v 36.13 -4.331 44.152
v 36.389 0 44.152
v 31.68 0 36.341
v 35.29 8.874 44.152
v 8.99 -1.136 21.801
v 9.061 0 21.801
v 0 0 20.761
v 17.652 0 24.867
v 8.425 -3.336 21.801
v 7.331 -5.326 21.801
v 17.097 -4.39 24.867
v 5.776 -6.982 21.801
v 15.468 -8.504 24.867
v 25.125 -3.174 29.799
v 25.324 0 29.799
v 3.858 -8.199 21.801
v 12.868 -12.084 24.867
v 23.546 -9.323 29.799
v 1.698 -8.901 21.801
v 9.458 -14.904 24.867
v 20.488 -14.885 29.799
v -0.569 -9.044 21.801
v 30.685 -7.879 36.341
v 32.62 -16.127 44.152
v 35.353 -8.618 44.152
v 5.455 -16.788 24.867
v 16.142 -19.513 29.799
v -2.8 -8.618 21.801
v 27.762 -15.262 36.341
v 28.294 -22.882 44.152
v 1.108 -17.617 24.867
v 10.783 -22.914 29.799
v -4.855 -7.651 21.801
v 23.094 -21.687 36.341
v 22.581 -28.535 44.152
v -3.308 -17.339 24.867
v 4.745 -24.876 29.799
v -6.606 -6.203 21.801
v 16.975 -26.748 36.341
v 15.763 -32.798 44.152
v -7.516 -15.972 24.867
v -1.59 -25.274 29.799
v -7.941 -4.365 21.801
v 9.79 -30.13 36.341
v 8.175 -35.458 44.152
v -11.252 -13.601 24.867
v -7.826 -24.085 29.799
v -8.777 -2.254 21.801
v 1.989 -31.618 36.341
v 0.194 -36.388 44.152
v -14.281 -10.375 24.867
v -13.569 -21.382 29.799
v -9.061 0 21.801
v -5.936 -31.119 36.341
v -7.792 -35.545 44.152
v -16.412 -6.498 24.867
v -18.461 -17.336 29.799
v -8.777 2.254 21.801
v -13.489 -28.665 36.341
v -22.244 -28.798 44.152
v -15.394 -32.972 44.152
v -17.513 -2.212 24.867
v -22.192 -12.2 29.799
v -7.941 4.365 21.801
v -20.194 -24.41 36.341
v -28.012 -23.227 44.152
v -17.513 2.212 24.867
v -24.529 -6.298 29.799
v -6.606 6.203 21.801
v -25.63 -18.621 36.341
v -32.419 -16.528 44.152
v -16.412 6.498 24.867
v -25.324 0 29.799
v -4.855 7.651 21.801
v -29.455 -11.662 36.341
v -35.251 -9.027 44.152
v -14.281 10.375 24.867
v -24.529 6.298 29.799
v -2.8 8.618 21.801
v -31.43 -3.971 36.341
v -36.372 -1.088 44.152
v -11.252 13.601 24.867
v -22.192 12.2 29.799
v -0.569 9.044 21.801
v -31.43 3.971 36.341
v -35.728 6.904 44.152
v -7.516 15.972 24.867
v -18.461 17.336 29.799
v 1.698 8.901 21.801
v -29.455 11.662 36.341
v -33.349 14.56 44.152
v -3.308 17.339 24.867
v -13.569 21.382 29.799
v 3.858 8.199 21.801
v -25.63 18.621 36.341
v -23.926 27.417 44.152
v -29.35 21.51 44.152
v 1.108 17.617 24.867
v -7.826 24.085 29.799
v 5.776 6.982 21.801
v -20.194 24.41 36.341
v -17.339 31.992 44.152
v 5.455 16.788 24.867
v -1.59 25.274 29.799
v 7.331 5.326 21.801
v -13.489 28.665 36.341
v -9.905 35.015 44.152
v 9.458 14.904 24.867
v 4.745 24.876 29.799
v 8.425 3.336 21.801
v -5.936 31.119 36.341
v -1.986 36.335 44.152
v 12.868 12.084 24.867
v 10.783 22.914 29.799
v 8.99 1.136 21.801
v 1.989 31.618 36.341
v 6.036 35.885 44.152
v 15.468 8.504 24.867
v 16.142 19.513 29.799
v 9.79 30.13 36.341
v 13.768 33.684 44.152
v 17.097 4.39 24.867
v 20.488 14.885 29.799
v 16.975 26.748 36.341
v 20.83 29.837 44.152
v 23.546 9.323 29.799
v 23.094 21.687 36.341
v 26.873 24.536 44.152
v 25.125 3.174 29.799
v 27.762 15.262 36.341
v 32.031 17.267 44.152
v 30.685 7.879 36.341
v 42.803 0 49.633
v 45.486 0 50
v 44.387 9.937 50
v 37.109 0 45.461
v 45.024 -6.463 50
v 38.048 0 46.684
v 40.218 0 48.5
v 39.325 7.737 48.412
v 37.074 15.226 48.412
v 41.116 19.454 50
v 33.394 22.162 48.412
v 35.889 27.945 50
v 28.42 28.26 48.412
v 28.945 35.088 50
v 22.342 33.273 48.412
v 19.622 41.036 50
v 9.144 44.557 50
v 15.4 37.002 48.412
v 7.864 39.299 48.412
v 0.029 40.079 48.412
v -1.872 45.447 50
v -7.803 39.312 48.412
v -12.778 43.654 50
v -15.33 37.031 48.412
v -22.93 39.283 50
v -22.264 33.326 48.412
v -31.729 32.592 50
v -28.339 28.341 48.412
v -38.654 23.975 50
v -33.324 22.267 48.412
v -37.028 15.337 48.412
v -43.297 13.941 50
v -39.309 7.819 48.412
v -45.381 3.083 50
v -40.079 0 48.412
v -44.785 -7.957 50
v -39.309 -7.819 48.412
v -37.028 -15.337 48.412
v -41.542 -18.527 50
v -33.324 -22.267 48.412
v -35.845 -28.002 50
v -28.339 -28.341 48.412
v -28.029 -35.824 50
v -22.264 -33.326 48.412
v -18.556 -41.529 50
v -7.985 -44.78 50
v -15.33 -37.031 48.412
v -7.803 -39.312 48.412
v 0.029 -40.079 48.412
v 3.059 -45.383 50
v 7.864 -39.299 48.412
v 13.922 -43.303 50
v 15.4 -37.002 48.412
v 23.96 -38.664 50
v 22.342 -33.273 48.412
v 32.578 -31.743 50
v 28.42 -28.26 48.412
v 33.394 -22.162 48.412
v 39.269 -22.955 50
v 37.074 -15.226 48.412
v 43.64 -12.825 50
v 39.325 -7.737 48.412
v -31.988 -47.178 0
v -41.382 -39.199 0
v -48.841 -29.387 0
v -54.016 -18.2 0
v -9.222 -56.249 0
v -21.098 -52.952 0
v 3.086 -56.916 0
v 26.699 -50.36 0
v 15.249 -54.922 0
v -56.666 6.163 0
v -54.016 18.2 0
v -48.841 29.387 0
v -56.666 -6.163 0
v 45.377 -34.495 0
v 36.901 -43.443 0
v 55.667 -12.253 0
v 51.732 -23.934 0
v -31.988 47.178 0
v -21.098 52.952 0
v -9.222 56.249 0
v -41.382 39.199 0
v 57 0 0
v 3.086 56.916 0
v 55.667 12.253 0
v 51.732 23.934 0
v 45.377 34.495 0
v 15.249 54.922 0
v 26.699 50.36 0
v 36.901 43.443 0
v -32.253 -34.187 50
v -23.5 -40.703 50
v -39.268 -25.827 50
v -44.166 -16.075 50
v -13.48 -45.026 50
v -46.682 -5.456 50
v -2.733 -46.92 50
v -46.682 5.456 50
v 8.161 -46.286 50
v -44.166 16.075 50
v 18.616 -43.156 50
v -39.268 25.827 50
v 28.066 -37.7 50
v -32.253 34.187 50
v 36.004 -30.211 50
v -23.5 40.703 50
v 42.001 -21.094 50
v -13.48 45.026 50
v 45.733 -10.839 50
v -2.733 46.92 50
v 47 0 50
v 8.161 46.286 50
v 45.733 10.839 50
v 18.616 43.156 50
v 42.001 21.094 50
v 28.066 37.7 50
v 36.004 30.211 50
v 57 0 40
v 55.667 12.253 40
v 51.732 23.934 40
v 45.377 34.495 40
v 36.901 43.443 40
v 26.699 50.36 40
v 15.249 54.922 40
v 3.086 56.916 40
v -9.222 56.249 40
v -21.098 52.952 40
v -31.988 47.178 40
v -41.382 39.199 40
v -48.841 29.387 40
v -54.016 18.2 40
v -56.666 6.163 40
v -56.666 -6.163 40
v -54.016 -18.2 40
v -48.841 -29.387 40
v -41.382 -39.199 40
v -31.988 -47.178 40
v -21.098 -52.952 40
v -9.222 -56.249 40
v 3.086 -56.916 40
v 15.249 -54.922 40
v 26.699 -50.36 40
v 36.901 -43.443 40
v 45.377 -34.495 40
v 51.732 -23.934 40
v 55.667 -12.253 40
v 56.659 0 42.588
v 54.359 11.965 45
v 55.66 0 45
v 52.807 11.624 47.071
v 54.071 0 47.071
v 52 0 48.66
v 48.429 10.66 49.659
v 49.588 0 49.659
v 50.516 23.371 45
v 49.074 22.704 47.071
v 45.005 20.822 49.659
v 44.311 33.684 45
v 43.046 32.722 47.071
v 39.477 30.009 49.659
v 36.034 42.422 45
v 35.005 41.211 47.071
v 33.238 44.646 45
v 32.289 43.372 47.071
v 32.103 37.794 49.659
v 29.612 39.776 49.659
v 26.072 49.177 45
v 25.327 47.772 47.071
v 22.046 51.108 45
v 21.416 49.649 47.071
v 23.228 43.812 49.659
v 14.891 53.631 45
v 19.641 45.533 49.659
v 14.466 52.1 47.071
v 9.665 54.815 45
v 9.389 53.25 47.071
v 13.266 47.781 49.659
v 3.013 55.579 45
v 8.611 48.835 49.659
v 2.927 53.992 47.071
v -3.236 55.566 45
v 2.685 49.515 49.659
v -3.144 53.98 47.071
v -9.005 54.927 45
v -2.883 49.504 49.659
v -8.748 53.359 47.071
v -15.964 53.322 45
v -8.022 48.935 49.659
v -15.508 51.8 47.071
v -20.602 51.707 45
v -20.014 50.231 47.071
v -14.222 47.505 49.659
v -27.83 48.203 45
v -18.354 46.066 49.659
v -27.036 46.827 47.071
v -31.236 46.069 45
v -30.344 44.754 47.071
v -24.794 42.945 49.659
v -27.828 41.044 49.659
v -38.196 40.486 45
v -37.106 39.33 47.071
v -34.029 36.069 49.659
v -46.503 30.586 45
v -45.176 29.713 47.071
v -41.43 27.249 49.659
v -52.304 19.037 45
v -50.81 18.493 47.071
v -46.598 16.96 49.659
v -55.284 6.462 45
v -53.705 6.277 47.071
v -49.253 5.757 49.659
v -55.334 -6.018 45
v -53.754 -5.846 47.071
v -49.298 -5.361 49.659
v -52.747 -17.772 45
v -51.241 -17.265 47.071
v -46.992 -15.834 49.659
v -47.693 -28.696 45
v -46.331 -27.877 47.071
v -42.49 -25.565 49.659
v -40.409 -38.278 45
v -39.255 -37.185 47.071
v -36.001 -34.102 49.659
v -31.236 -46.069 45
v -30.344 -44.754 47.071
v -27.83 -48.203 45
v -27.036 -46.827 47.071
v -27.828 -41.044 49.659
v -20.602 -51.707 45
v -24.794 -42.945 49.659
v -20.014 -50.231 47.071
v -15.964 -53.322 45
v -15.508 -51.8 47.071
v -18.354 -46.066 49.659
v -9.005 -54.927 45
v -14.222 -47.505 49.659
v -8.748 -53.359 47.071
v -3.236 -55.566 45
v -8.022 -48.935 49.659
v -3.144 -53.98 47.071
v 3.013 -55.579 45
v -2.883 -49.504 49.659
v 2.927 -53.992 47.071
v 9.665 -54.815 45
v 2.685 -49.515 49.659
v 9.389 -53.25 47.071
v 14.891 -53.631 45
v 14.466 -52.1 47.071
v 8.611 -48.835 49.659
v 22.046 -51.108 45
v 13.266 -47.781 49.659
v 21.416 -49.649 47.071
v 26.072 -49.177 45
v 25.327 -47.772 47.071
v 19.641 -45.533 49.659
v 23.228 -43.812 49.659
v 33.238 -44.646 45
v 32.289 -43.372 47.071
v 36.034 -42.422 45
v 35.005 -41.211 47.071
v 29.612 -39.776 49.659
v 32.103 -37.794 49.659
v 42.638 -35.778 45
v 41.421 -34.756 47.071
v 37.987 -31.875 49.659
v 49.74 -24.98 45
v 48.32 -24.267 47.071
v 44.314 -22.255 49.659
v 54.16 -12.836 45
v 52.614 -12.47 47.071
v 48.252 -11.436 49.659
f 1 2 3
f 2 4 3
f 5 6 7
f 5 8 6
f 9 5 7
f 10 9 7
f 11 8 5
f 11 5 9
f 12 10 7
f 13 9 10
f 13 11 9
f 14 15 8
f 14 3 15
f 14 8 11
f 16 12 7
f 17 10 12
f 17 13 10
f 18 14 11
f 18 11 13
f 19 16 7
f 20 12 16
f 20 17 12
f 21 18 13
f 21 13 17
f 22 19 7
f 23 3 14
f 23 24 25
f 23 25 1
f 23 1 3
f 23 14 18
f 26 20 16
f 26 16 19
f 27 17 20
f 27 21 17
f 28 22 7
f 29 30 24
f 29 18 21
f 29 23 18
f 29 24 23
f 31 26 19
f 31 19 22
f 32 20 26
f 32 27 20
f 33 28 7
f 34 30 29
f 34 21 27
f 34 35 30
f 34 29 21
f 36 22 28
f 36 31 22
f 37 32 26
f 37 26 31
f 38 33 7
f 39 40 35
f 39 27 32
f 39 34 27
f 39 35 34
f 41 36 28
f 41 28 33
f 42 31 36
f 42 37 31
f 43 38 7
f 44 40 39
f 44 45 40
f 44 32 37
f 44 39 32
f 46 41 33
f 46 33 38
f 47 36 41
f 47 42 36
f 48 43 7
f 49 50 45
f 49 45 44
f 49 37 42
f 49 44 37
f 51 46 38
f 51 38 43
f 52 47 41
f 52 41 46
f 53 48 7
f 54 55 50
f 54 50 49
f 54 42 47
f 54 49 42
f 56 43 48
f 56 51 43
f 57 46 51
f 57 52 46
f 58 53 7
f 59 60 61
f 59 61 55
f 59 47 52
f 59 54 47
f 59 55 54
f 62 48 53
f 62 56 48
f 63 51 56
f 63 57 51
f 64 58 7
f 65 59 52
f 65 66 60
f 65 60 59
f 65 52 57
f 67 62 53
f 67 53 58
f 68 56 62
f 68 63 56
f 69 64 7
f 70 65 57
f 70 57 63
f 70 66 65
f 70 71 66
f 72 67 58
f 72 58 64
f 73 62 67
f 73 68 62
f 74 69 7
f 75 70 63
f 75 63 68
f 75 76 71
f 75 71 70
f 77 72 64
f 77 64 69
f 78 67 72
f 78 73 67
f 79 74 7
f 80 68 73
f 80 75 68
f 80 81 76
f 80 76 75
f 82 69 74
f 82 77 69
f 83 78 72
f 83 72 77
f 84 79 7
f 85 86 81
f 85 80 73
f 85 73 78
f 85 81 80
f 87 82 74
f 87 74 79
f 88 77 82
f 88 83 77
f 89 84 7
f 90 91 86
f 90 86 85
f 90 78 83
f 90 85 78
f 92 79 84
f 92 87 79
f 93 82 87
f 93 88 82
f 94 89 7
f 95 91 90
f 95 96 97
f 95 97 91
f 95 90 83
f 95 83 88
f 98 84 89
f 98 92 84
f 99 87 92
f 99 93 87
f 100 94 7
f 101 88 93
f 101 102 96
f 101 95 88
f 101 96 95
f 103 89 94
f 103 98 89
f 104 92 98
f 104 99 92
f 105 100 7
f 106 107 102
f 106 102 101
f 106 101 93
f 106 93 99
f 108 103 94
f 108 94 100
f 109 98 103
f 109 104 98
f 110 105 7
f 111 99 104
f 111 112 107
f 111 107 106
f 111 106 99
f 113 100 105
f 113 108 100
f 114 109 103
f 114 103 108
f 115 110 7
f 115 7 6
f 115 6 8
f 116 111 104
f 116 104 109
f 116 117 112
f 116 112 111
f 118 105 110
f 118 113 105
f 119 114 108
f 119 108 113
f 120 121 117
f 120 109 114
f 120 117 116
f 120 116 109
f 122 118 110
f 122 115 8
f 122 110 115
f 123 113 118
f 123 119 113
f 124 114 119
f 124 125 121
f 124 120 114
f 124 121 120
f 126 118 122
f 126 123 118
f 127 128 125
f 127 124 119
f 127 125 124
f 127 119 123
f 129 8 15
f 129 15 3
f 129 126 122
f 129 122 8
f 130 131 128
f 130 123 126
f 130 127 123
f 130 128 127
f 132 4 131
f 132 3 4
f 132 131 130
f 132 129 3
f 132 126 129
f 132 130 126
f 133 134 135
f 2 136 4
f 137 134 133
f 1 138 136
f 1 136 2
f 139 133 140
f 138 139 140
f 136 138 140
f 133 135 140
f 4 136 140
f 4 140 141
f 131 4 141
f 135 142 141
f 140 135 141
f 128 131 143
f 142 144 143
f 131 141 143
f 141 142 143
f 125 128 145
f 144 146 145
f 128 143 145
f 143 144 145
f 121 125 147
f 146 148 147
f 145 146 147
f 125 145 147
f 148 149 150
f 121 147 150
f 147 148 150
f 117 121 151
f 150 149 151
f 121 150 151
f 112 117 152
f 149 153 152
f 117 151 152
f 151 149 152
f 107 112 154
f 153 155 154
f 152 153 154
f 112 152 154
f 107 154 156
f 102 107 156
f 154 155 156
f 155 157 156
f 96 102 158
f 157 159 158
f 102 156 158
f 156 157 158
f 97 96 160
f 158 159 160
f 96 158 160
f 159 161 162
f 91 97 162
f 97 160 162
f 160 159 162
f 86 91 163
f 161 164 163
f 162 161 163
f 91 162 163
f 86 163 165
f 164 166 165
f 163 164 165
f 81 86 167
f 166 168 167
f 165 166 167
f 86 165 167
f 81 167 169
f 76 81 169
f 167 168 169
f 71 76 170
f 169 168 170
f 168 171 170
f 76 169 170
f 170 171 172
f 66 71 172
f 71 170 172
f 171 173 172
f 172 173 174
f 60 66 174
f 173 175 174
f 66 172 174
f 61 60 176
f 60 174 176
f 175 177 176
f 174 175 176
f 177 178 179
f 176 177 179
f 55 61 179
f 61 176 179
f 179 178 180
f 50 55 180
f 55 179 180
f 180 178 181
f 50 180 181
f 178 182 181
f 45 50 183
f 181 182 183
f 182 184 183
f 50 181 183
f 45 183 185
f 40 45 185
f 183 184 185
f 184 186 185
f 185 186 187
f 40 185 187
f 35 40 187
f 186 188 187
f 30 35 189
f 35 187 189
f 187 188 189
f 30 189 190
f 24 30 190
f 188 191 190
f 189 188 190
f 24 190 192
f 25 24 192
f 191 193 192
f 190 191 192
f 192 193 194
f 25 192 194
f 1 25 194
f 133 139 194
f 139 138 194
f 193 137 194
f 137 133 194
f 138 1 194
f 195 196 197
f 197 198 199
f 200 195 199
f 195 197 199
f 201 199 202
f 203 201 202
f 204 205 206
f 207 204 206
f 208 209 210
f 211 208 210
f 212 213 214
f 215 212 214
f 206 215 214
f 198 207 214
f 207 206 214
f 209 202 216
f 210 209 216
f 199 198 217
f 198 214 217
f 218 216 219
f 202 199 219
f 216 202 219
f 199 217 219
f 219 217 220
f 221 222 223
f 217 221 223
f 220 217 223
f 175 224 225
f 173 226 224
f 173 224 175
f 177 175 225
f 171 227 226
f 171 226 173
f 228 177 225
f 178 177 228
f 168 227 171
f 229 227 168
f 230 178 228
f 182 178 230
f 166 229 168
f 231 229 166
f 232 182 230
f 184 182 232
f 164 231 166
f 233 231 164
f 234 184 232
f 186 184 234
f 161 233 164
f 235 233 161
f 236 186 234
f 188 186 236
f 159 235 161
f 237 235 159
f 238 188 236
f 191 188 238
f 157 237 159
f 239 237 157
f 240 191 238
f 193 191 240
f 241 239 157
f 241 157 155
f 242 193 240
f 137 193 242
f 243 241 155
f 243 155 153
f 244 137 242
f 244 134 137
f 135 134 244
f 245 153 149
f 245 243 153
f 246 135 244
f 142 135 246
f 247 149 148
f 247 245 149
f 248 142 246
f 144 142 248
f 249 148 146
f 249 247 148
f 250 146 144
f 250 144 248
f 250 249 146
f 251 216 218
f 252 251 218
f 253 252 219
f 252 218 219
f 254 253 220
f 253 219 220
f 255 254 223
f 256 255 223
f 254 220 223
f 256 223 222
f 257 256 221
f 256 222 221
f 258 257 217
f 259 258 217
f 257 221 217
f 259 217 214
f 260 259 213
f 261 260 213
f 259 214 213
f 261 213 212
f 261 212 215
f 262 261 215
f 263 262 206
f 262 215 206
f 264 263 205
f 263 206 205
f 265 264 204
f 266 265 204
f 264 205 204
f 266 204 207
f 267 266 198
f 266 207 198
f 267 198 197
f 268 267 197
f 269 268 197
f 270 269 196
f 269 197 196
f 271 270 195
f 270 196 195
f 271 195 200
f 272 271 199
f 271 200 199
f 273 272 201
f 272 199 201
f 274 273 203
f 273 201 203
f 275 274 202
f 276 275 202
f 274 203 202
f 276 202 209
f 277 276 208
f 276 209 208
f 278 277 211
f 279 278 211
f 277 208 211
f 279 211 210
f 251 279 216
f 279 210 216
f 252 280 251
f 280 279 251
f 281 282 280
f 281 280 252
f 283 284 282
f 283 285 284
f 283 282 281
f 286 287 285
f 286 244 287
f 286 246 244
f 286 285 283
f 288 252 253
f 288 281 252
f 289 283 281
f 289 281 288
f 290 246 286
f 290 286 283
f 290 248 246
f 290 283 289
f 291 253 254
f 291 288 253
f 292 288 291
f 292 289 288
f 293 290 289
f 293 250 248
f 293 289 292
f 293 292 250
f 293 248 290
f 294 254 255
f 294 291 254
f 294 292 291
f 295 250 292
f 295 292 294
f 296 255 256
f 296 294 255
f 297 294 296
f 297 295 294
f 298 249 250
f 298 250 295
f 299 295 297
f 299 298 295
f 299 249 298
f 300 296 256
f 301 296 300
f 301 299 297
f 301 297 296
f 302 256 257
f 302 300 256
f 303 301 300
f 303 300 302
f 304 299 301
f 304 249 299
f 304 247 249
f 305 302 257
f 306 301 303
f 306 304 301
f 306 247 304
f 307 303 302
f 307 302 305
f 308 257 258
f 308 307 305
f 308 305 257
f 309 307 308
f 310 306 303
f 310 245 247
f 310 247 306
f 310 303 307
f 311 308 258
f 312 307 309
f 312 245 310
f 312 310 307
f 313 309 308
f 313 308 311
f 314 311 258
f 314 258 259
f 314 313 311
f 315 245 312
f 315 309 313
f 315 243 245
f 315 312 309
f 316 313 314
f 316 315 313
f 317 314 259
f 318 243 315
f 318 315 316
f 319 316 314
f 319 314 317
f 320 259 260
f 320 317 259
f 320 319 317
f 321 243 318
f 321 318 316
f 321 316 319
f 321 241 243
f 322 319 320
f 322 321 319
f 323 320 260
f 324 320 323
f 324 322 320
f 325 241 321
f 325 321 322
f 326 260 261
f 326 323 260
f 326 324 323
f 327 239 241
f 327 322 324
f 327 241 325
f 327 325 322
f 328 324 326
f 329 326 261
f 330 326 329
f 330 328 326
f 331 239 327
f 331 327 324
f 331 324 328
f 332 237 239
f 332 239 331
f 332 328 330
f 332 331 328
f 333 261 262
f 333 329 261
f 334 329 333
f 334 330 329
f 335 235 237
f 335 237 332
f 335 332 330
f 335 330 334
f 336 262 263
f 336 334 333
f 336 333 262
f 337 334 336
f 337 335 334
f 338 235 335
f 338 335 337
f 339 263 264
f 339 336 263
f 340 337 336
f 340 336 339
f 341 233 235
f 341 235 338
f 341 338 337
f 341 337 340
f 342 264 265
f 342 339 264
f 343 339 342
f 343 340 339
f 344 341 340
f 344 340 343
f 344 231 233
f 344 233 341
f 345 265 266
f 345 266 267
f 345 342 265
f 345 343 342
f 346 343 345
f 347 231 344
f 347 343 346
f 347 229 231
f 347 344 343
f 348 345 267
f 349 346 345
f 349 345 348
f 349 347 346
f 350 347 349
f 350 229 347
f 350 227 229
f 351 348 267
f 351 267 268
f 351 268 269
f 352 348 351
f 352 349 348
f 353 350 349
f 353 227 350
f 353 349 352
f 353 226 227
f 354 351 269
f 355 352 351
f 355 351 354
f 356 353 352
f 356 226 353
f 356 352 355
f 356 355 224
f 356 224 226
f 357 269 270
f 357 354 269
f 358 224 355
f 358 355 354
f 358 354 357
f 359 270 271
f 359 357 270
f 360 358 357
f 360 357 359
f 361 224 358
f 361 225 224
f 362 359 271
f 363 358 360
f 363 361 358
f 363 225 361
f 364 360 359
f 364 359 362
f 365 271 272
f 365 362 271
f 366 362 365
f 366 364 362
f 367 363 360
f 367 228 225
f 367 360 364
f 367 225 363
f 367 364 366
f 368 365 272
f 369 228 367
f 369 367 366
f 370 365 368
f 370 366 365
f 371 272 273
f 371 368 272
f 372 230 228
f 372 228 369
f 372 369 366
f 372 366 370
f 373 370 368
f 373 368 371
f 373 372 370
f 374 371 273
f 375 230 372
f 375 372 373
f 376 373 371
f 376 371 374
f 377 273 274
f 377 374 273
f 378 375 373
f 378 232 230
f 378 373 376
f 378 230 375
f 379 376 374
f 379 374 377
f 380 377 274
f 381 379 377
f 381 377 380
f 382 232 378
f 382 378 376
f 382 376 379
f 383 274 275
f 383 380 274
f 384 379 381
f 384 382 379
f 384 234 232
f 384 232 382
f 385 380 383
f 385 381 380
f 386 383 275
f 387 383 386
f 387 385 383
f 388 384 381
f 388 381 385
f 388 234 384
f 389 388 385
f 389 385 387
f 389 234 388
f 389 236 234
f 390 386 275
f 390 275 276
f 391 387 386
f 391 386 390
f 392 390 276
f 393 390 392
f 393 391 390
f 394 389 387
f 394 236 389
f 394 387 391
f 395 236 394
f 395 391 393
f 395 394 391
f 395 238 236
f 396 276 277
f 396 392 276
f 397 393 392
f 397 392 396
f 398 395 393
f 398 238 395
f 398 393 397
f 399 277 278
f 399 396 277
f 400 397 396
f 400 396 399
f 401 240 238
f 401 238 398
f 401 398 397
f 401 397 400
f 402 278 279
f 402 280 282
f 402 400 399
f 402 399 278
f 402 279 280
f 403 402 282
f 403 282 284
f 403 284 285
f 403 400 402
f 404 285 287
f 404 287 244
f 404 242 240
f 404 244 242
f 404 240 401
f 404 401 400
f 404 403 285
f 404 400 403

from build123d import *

# Parameters (mm, degrees)
F0_R     = 57
F2_DEPTH = 50
F4_R     = 10


with BuildPart() as f2:
    # F0 (on Top) → F2 (new body)
    with BuildSketch(Plane.XY):
        Circle(F0_R)
    extrude(amount=F2_DEPTH)

    # F1 (on Front) → F3 (revolve, cut)
    with BuildSketch(Plane.XZ):
        with BuildLine():
            Line((0, 100.7613007724), (0, 20.7613007724))
            ThreePointArc((0, 20.7613007724), (40, 60.7613007724), (0, 100.7613007724))
        make_face()
    revolve(axis=Axis((0, 0, 40.7613007724), (0, 0, -1)), mode=Mode.SUBTRACT)

    # F4
    f4_edges = [f2.edges().sort_by_distance(p)[0] for p in [
        (-57, 0, 50),
        (-38.525244, 0, 50),
    ]]
    fillet(f4_edges, radius=F4_R)


solid = f2.part
